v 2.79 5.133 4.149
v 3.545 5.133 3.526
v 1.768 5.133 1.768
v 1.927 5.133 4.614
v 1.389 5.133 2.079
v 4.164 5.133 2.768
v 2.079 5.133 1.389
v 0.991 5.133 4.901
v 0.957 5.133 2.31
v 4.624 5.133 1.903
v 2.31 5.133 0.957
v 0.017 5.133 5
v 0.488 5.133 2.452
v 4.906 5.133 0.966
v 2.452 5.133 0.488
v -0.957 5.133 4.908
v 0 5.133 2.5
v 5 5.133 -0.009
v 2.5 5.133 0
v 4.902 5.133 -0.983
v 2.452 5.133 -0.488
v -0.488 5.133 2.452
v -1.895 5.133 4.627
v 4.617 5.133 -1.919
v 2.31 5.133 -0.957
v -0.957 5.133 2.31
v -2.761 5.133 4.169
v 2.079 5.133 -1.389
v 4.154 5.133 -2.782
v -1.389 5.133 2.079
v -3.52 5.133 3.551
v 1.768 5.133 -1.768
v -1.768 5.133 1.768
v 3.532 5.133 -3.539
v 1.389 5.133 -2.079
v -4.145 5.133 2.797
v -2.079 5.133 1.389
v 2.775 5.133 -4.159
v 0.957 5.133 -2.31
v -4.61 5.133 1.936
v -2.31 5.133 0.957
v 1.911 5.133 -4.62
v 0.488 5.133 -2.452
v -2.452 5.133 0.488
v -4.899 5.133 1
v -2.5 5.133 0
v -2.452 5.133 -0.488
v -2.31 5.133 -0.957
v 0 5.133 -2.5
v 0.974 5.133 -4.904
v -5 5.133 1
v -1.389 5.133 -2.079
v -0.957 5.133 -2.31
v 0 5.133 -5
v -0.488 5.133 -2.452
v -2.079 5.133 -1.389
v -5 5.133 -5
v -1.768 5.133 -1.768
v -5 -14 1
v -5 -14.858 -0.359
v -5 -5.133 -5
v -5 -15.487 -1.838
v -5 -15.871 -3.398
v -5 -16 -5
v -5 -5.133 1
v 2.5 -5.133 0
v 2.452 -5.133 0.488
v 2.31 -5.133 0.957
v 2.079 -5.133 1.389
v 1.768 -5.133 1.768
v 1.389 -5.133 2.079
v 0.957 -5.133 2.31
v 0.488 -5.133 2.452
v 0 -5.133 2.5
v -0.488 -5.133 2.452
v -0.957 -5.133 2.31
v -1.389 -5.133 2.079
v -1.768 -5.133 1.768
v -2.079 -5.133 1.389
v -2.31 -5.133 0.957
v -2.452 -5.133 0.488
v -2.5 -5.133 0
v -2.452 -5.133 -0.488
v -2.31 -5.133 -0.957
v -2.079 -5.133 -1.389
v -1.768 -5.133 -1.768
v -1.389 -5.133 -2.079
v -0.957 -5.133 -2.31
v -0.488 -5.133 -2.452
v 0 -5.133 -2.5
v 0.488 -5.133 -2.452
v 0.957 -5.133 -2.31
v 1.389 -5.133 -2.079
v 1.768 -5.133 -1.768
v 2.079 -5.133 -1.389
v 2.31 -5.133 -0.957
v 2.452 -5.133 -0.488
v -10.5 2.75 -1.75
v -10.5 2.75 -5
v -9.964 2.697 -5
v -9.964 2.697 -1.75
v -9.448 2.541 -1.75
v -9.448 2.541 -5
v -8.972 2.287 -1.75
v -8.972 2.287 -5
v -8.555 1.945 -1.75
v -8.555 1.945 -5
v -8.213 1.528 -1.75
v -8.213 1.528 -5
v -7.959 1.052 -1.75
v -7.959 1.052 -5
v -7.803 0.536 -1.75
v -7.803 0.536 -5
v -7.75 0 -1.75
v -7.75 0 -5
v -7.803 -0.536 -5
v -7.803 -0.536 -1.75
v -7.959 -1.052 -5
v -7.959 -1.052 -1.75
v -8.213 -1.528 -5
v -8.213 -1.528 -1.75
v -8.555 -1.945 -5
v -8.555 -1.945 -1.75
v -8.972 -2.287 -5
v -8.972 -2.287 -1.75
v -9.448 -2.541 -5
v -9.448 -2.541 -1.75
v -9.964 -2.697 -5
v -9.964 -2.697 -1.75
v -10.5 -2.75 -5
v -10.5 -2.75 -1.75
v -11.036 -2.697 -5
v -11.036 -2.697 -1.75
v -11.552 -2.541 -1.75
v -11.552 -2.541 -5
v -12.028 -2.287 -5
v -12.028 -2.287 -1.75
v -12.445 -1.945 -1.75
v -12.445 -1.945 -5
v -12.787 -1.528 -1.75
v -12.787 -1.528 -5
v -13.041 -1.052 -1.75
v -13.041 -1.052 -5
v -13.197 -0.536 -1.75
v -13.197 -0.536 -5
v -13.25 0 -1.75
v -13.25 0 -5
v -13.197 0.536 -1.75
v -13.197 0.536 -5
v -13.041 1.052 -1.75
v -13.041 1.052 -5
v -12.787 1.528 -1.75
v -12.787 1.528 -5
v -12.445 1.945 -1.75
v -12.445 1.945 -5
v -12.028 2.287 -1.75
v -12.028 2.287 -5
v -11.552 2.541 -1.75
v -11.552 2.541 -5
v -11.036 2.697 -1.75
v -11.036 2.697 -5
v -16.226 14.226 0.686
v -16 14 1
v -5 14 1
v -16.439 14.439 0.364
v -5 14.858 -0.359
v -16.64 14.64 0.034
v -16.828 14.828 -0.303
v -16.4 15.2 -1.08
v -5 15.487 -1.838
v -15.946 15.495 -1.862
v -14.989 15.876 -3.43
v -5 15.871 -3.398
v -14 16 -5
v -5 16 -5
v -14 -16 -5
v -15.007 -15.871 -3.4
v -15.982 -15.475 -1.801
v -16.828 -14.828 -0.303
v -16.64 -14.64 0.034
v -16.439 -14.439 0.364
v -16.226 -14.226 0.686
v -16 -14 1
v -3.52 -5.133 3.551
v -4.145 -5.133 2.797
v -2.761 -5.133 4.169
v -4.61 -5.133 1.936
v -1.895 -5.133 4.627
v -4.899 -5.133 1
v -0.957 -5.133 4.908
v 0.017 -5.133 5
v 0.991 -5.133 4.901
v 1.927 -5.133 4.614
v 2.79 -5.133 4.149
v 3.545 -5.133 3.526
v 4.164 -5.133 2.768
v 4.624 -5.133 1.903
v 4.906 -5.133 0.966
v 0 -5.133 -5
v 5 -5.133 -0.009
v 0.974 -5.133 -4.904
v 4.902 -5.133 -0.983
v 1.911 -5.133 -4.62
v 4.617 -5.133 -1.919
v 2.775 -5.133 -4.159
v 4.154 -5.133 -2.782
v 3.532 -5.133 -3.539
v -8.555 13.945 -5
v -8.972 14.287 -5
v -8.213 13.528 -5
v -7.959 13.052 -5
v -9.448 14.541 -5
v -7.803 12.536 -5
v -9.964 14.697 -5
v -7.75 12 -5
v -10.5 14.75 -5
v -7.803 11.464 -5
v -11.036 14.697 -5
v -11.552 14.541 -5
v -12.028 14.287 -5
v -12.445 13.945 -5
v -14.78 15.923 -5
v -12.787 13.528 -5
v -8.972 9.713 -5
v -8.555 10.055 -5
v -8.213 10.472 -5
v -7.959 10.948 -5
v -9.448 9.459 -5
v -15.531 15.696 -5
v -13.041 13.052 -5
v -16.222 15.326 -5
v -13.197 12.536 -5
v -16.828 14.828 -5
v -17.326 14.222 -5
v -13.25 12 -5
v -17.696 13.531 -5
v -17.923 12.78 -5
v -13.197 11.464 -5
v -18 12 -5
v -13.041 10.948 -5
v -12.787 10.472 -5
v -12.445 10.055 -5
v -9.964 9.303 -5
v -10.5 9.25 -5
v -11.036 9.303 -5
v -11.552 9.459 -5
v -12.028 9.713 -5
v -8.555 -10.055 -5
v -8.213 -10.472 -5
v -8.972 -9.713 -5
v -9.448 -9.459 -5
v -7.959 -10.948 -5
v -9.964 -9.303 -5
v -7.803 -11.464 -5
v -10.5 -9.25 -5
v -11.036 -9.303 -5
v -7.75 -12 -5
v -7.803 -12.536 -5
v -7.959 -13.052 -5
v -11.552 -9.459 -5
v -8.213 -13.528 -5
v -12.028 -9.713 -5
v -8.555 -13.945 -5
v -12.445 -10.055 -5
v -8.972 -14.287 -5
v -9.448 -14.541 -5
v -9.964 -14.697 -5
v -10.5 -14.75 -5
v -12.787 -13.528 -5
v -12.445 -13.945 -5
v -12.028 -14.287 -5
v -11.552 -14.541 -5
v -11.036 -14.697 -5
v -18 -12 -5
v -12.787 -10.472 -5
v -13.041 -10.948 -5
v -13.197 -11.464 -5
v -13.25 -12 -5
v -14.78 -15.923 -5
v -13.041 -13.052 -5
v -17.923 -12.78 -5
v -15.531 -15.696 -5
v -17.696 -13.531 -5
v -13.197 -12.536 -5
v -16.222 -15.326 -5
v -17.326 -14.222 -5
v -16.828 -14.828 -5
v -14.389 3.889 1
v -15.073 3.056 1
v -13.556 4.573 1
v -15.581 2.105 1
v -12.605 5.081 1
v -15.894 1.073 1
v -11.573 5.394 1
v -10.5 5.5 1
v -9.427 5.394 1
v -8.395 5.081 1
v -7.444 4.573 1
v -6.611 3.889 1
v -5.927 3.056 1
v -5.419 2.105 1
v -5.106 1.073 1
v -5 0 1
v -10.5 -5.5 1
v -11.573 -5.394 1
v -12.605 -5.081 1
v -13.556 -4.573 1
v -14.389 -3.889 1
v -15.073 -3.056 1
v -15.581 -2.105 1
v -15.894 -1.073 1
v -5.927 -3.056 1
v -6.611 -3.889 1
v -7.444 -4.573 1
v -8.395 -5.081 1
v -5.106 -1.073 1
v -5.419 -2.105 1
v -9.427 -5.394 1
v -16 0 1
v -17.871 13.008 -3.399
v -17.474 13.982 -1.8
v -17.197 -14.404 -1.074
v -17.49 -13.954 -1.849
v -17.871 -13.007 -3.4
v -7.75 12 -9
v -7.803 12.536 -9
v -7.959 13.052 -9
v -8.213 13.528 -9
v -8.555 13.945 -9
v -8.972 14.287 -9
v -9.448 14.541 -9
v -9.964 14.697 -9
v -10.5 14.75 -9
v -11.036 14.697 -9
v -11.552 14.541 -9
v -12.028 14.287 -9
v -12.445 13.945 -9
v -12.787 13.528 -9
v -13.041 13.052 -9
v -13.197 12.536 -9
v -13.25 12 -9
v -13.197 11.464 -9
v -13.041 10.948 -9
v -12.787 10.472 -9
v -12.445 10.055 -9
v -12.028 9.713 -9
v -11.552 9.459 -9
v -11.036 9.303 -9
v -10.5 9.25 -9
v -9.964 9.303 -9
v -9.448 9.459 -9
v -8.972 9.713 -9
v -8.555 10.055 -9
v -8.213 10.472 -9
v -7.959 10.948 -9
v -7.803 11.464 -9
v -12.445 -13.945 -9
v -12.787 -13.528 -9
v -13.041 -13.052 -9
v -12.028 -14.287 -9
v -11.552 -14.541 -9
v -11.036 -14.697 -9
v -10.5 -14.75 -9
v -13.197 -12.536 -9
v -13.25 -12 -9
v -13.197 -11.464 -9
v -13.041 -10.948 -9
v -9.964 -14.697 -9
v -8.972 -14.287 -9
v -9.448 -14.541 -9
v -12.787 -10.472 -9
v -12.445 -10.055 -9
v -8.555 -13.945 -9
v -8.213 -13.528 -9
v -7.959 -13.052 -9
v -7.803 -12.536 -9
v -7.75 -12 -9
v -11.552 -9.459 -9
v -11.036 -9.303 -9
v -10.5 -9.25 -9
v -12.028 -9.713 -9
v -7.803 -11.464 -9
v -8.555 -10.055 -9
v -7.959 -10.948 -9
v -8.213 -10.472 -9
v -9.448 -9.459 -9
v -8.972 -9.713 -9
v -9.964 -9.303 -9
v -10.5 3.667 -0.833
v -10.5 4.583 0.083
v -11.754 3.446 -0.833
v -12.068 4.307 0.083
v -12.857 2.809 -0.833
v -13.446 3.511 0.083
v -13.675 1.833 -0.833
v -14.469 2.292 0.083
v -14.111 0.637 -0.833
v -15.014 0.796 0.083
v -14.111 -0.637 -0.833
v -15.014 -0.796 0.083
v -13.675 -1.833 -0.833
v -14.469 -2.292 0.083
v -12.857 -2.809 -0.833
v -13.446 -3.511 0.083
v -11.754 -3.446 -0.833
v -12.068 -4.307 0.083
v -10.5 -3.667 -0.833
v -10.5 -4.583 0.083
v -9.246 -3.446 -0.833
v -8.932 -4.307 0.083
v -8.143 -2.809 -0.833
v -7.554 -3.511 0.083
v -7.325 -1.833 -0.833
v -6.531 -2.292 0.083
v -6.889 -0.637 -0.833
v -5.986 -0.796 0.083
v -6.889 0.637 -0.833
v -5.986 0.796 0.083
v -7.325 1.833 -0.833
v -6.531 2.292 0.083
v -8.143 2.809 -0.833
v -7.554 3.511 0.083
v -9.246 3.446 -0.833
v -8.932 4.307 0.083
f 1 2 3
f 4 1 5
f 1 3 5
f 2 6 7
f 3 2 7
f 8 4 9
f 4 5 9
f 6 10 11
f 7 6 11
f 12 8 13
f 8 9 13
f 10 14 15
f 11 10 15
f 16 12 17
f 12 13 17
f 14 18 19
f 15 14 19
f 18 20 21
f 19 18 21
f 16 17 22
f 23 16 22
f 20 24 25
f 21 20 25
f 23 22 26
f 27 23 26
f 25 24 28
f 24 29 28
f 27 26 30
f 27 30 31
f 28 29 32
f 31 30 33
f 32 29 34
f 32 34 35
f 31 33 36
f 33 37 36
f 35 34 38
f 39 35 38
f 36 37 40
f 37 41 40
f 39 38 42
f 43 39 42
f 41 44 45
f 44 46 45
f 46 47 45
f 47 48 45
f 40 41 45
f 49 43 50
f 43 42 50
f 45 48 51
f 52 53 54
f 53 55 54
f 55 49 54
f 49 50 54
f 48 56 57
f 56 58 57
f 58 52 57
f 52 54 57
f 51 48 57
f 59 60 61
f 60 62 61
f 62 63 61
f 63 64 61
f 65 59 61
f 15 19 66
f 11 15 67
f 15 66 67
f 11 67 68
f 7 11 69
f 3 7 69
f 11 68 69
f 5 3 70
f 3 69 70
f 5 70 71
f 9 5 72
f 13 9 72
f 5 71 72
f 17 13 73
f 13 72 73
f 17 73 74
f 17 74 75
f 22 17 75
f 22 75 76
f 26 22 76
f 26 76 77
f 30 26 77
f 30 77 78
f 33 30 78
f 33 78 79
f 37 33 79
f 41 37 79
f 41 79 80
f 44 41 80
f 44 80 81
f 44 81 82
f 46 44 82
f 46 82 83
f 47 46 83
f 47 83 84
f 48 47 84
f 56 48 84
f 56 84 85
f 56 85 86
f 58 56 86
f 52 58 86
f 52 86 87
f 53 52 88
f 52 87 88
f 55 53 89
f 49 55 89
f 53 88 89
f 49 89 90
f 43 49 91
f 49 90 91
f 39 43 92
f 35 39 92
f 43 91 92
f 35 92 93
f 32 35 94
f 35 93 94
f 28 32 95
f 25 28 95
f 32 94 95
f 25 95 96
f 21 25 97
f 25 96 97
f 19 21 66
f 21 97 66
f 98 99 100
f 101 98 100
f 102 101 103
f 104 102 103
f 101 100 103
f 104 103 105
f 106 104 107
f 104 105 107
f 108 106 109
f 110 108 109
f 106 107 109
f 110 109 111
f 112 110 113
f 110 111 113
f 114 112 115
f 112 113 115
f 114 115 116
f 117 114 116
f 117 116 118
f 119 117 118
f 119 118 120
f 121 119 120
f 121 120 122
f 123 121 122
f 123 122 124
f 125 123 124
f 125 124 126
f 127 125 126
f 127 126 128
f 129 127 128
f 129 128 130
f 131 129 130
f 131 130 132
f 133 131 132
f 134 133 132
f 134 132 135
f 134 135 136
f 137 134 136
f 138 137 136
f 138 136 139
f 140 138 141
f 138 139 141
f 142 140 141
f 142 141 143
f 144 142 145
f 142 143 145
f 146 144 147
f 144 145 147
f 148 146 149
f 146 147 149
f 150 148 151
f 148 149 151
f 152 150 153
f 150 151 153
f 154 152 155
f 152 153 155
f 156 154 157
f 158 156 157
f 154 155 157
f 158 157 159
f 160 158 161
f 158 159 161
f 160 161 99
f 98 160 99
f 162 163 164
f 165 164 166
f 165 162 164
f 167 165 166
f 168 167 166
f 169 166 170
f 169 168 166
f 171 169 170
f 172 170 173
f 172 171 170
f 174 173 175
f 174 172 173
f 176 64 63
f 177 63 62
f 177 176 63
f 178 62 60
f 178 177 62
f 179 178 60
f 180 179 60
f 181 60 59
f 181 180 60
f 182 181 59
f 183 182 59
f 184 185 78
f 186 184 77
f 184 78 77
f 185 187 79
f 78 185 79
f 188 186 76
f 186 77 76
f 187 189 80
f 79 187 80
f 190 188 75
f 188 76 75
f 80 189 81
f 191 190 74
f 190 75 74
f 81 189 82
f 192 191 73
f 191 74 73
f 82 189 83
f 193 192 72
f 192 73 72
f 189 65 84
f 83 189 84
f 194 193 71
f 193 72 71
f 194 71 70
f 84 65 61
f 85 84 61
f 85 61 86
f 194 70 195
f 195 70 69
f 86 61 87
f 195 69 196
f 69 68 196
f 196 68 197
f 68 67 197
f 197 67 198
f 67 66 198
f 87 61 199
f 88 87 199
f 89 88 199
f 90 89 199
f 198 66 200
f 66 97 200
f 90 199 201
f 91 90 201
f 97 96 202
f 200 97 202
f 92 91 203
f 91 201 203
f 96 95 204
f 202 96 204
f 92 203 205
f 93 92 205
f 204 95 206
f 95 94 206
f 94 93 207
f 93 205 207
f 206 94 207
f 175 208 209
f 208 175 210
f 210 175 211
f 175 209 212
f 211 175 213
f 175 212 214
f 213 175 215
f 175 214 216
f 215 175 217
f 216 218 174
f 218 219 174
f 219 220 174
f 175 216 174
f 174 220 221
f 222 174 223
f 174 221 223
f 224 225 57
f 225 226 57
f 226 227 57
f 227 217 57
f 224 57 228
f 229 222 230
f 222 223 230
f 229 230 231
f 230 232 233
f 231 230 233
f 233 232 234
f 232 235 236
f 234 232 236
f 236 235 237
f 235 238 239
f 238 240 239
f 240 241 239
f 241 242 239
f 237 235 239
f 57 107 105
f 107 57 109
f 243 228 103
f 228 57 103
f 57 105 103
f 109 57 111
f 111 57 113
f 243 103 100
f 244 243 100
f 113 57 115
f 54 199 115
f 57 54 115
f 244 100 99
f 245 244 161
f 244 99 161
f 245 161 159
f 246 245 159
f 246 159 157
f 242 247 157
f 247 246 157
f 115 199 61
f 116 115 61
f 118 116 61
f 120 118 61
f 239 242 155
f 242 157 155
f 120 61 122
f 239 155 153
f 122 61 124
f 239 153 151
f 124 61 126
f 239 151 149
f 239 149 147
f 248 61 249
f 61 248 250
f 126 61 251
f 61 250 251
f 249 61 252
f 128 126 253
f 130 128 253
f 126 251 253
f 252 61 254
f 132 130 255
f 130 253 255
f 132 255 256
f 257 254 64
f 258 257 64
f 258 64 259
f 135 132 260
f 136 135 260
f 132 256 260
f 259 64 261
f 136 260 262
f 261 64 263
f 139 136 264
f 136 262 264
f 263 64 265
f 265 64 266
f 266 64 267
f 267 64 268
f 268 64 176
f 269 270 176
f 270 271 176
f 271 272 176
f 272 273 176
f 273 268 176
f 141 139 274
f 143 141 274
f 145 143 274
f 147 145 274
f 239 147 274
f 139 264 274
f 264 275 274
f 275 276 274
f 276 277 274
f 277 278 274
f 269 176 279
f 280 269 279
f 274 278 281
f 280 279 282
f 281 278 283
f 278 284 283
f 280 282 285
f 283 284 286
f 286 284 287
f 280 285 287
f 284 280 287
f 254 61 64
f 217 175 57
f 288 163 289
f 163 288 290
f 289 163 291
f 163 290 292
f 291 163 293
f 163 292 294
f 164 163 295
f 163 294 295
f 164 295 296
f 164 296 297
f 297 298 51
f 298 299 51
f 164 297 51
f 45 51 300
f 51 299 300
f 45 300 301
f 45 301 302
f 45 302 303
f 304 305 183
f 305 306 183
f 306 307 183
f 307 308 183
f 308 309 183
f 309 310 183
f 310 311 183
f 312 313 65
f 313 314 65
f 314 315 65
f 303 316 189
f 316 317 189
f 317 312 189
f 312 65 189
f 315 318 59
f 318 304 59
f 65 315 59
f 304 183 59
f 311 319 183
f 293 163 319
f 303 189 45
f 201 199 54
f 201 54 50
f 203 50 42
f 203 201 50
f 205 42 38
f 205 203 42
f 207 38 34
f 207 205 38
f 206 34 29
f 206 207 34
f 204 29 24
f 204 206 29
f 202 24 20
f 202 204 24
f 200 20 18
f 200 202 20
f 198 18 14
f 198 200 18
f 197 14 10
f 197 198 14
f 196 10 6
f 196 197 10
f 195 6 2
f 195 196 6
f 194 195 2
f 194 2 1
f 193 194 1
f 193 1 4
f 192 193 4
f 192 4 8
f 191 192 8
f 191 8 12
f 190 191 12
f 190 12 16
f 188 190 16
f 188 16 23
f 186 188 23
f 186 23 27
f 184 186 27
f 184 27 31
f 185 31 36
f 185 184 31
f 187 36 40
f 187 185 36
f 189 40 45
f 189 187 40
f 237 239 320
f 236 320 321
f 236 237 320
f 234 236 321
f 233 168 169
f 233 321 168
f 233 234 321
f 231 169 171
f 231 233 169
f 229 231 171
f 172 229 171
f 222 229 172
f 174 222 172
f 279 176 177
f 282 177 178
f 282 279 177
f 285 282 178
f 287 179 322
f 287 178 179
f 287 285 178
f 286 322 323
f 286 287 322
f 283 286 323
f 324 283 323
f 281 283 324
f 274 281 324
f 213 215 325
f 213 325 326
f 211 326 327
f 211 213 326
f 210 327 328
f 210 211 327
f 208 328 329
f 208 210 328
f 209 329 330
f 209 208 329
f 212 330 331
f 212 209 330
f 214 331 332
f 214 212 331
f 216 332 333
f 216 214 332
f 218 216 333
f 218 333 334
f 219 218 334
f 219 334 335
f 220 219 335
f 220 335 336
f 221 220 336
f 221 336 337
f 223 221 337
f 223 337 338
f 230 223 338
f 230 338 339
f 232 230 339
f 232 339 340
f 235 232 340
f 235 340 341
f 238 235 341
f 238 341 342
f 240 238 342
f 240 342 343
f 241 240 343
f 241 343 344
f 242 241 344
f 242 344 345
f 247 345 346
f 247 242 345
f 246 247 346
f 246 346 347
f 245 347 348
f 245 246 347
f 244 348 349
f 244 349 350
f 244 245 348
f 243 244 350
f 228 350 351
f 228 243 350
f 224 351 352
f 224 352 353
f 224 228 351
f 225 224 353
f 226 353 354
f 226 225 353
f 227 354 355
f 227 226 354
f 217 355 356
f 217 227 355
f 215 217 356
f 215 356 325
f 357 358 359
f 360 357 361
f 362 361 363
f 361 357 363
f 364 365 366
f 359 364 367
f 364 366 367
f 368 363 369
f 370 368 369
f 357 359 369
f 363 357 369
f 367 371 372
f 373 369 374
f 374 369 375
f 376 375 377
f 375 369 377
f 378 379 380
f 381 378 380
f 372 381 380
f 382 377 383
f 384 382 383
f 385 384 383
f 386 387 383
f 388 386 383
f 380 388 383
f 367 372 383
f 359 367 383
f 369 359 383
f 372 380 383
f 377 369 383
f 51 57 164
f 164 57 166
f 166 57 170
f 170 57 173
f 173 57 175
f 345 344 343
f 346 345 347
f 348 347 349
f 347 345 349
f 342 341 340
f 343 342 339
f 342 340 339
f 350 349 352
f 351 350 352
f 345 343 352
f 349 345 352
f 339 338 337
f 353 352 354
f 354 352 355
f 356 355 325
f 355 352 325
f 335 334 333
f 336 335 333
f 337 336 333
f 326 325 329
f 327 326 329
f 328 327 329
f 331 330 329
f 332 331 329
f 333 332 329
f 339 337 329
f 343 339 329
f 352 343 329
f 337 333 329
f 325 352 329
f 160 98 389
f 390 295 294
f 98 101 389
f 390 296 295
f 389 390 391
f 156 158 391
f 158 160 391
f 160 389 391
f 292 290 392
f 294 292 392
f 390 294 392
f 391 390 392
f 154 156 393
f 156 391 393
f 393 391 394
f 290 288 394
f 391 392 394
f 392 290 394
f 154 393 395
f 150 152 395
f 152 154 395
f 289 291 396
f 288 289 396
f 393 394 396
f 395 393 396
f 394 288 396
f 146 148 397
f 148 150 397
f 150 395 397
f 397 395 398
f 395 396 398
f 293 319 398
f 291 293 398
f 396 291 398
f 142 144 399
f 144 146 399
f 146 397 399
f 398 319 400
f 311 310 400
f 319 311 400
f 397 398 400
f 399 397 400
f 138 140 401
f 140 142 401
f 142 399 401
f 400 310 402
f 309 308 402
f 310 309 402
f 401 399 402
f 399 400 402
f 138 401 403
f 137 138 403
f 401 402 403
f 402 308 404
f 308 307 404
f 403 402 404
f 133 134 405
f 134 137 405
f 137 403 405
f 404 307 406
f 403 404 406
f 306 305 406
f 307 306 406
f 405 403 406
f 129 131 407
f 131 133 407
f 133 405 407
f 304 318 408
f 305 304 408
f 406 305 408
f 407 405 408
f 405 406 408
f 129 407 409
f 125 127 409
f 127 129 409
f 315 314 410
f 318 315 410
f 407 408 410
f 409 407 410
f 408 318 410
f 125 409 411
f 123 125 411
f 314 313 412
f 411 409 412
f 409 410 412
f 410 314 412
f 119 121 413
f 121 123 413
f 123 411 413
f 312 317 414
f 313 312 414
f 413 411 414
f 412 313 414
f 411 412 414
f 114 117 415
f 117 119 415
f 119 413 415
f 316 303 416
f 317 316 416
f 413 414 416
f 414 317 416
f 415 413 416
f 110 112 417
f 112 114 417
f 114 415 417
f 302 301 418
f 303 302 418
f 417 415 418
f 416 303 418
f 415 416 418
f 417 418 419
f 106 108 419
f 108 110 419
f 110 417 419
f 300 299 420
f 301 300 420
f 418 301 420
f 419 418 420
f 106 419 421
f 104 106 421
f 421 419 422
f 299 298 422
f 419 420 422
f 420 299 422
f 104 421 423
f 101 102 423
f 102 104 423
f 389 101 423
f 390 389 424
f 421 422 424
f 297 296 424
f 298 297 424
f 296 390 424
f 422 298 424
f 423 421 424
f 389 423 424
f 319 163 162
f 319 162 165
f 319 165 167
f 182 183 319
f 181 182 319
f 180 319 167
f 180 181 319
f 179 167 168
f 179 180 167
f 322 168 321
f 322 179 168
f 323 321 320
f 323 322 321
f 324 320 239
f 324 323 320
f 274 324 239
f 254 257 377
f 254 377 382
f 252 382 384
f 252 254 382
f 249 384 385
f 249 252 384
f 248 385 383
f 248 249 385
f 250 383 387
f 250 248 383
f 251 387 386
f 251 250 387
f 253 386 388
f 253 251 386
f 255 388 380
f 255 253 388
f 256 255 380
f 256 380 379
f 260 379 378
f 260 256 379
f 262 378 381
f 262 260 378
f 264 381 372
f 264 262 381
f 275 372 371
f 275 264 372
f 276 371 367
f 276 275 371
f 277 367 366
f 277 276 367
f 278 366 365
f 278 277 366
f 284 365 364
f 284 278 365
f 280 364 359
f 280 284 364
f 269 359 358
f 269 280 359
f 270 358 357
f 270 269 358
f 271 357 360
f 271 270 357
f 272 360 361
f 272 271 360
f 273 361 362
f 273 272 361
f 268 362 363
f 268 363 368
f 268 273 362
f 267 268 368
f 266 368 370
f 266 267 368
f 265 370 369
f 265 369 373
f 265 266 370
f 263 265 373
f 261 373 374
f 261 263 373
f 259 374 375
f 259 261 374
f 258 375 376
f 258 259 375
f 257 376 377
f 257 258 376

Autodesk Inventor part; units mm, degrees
sketch "Sketch_1" plane through (0, 0, 0) normal (0, 0, 1) x (1, 0, 0)
  line L0 (0, -16) -> (0, 16)
  line L1 (0, 16) -> (5, 16)
  line L2 (5, 16) -> (5, -16)
  line L3 (5, -16) -> (0, -16)
  line L4 (0, -16) -> (0, 16)
revolve "Revolution1" add sketch "Sketch_1" angle 360 about axis through (0, -16, 0) along (0, -1, 0)
sketch "Sketch_2" plane through (0, 0, 0) normal (0, 1, 0) x (-1, 0, 0)
  arc A0 (18, -5) -> (16, 1) centre (8, -5) ccw
  line L0 (16, 1) -> (0, 1)
  line L1 (0, 1) -> (0, -5)
  line L2 (0, -5) -> (18, -5)
extrude "Extrusion1" add sketch "Sketch_2" along normal mid plane 32
sketch "Sketch_3" plane through (0, 0, 0) normal (0, 0, 1) x (1, 0, 0)
  line L0 (-36, -36) -> (36, -36)
  line L1 (36, -36) -> (36, 36)
  line L2 (36, 36) -> (-36, 36)
  line L3 (-36, 36) -> (-36, -36)
  line L4 (-18, 12) -> (-18, -12)
  arc A0 (-18, -12) -> (-14, -16) centre (-14, -12) ccw
  line L5 (-14, -16) -> (-5, -16)
  line L6 (-5, -16) -> (-5, -5.1333)
  line L7 (-5, -5.1333) -> (5, -5.1333)
  line L8 (5, -5.1333) -> (5, 5.1333)
  line L9 (5, 5.1333) -> (-5, 5.1333)
  line L10 (-5, 5.1333) -> (-5, 16)
  line L11 (-5, 16) -> (-14, 16)
  arc A1 (-14, 16) -> (-18, 12) centre (-14, 12) ccw
extrude "Extrusion2" cut sketch "Sketch_3" along normal mid plane 10
sketch "Sketch_4" plane through (-18, 0, 0) normal (1, 0, 0) x (0, 0, -1)
  line L0 (-5, -32) -> (10, -32)
  line L1 (10, -32) -> (10, 32)
  line L2 (10, 32) -> (-5, 32)
  line L3 (-5, 32) -> (-5, -32)
  line L4 (-1, 14) -> (-1, -14)
  arc A0 (-1, -14) -> (5, -16) centre (5, -6) ccw
  line L5 (5, -16) -> (5, 16)
  arc A1 (5, 16) -> (-1, 14) centre (5, 6) ccw
extrude "Extrusion3" cut sketch "Sketch_4" along normal blind 13
sketch "Sketch_6" plane through (0, 0, -5) normal (0, 0, 1) x (1, 0, 0)
  circle A0 centre (-10.5, 12) radius 2.75
extrude "Extrusion4" add sketch "Sketch_6" against normal blind 4
sketch "Sketch_5" plane through (0, 0, -5) normal (0, 0, 1) x (1, 0, 0)
  circle A0 centre (-10.5, -12) radius 2.75
extrude "Extrusion5" add sketch "Sketch_5" against normal blind 4
sketch "Sketch_7" plane through (-10.5, 0, 0) normal (1, 0, 0) x (0, 0, -1)
  line L0 (5, 0) -> (-1, 0)
  line L1 (-1, 0) -> (-1, 5.5)
  line L2 (-1, 5.5) -> (1.75, 2.75)
  line L3 (1.75, 2.75) -> (5, 2.75)
  line L4 (5, 2.75) -> (5, 0)
  line L5 (5, 0) -> (-1, 0)
revolve "Revolution2" cut sketch "Sketch_7" angle 360 about axis through (-10.5, 0, -5) along (0, 0, -1)
sketch "Sketch_8" plane through (0, 0, 0) normal (0, 0, 1) x (1, 0, 0)
  line L0 (0, -16) -> (0, 16)
  line L1 (0, 16) -> (2.5, 16)
  line L2 (2.5, 16) -> (2.5, -16)
  line L3 (2.5, -16) -> (0, -16)
  line L4 (0, -16) -> (0, 16)
revolve "Revolution3" cut sketch "Sketch_8" angle 360 about axis through (0, -16, 0) along (0, -1, 0)
ref_plane "hhpsjc_l_XY" through (0, 0, 0) normal (0, 1, 0) x (1, 0, 0)
ref_plane "hhpsjc_l_YZ" through (0, 0, 0) normal (1, 0, 0) x (0, 0, -1)
ref_plane "hhpsjc_l_ZX" through (0, 0, 0) normal (0, 0, -1) x (0, 1, 0)
ref_plane "hole1_to_bolt_XY" through (-10.5, 0, 1) normal (0, 0, 1) x (1, 0, 0)
ref_plane "hole1_to_bolt_YZ" through (-10.5, 0, 1) normal (1, 0, 0) x (0, 1, 0)
ref_plane "hole1_to_bolt_ZX" through (-10.5, 0, 1) normal (0, 1, 0) x (0, 0, 1)
ref_plane "nut1_to_bolt_XY" through (-10.5, 0, -7) normal (0, 0, 1) x (1, 0, 0)
ref_plane "nut1_to_bolt_YZ" through (-10.5, 0, -7) normal (1, 0, 0) x (0, 1, 0)
ref_plane "nut1_to_bolt_ZX" through (-10.5, 0, -7) normal (0, 1, 0) x (0, 0, 1)
properties part number "HHPSJC5-125_l"
